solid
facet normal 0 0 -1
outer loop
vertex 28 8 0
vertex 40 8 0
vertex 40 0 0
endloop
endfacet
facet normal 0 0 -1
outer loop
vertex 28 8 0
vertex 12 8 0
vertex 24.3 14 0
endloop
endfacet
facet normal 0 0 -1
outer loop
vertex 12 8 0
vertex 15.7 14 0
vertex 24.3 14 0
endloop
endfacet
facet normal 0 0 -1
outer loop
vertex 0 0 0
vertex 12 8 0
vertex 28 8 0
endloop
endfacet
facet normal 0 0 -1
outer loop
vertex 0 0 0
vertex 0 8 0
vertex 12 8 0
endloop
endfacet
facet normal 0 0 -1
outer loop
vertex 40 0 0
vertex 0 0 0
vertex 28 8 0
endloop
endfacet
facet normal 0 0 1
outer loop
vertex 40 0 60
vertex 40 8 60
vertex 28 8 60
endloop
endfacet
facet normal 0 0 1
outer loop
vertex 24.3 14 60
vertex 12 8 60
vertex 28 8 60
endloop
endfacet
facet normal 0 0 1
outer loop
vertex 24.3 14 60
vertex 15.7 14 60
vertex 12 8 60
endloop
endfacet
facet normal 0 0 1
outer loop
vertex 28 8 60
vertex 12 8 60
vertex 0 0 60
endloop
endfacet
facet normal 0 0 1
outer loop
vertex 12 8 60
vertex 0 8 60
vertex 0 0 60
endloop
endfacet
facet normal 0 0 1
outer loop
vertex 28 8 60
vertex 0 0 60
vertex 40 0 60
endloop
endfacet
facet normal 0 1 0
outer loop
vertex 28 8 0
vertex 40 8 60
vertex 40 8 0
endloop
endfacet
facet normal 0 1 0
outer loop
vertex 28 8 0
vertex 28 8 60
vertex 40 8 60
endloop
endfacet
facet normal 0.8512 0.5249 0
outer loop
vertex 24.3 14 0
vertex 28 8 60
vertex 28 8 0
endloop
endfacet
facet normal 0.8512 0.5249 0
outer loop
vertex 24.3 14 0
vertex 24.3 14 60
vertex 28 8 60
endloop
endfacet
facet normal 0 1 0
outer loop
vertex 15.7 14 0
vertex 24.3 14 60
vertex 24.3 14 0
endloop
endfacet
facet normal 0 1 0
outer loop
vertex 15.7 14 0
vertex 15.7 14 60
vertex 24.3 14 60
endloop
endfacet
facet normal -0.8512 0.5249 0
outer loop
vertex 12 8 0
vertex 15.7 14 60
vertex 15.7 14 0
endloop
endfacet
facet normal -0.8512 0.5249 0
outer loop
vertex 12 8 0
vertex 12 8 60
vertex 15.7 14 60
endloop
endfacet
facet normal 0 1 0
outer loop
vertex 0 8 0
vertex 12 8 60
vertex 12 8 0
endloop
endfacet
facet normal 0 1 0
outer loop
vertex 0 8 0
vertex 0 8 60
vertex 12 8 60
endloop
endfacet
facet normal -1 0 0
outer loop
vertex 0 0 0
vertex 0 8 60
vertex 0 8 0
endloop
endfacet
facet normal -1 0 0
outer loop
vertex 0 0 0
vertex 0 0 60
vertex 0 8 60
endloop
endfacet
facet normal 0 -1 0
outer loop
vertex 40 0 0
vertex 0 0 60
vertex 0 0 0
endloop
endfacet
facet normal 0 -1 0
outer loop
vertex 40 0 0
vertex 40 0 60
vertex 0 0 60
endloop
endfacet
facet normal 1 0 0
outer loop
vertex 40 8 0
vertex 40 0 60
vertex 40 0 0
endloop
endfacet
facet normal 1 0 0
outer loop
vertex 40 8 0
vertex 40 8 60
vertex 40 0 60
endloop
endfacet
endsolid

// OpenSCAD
$fn = 32;

// ----------------------------------------------------------------------
// V guide rail: dovetail, 40 mm wide
// ----------------------------------------------------------------------

// --- parameters (mm) ---
rail_w = 40;              // rail width, X
base_t = 8;               // base plate thickness
v_depth = 6;              // V feature depth / height
v_half_w = 8;             // half width of the V at the base face
plate_t = 60;             // rail length, Z (the extrusion height)
top_half_w = 4.3;         // half width at the dovetail top

dovetail_base = 2 * v_half_w;  // dovetail width at the base
dovetail_top = 2 * top_half_w;  // dovetail width at the top

profile = [[0, 0], [40, 0], [40, 8], [28, 8], [24.3, 14], [15.7, 14], [12, 8], [0, 8]];  // primary outline, 8 points, counter clockwise

// --- the one profile operation ---
linear_extrude(height = plate_t) polygon(points = profile);
